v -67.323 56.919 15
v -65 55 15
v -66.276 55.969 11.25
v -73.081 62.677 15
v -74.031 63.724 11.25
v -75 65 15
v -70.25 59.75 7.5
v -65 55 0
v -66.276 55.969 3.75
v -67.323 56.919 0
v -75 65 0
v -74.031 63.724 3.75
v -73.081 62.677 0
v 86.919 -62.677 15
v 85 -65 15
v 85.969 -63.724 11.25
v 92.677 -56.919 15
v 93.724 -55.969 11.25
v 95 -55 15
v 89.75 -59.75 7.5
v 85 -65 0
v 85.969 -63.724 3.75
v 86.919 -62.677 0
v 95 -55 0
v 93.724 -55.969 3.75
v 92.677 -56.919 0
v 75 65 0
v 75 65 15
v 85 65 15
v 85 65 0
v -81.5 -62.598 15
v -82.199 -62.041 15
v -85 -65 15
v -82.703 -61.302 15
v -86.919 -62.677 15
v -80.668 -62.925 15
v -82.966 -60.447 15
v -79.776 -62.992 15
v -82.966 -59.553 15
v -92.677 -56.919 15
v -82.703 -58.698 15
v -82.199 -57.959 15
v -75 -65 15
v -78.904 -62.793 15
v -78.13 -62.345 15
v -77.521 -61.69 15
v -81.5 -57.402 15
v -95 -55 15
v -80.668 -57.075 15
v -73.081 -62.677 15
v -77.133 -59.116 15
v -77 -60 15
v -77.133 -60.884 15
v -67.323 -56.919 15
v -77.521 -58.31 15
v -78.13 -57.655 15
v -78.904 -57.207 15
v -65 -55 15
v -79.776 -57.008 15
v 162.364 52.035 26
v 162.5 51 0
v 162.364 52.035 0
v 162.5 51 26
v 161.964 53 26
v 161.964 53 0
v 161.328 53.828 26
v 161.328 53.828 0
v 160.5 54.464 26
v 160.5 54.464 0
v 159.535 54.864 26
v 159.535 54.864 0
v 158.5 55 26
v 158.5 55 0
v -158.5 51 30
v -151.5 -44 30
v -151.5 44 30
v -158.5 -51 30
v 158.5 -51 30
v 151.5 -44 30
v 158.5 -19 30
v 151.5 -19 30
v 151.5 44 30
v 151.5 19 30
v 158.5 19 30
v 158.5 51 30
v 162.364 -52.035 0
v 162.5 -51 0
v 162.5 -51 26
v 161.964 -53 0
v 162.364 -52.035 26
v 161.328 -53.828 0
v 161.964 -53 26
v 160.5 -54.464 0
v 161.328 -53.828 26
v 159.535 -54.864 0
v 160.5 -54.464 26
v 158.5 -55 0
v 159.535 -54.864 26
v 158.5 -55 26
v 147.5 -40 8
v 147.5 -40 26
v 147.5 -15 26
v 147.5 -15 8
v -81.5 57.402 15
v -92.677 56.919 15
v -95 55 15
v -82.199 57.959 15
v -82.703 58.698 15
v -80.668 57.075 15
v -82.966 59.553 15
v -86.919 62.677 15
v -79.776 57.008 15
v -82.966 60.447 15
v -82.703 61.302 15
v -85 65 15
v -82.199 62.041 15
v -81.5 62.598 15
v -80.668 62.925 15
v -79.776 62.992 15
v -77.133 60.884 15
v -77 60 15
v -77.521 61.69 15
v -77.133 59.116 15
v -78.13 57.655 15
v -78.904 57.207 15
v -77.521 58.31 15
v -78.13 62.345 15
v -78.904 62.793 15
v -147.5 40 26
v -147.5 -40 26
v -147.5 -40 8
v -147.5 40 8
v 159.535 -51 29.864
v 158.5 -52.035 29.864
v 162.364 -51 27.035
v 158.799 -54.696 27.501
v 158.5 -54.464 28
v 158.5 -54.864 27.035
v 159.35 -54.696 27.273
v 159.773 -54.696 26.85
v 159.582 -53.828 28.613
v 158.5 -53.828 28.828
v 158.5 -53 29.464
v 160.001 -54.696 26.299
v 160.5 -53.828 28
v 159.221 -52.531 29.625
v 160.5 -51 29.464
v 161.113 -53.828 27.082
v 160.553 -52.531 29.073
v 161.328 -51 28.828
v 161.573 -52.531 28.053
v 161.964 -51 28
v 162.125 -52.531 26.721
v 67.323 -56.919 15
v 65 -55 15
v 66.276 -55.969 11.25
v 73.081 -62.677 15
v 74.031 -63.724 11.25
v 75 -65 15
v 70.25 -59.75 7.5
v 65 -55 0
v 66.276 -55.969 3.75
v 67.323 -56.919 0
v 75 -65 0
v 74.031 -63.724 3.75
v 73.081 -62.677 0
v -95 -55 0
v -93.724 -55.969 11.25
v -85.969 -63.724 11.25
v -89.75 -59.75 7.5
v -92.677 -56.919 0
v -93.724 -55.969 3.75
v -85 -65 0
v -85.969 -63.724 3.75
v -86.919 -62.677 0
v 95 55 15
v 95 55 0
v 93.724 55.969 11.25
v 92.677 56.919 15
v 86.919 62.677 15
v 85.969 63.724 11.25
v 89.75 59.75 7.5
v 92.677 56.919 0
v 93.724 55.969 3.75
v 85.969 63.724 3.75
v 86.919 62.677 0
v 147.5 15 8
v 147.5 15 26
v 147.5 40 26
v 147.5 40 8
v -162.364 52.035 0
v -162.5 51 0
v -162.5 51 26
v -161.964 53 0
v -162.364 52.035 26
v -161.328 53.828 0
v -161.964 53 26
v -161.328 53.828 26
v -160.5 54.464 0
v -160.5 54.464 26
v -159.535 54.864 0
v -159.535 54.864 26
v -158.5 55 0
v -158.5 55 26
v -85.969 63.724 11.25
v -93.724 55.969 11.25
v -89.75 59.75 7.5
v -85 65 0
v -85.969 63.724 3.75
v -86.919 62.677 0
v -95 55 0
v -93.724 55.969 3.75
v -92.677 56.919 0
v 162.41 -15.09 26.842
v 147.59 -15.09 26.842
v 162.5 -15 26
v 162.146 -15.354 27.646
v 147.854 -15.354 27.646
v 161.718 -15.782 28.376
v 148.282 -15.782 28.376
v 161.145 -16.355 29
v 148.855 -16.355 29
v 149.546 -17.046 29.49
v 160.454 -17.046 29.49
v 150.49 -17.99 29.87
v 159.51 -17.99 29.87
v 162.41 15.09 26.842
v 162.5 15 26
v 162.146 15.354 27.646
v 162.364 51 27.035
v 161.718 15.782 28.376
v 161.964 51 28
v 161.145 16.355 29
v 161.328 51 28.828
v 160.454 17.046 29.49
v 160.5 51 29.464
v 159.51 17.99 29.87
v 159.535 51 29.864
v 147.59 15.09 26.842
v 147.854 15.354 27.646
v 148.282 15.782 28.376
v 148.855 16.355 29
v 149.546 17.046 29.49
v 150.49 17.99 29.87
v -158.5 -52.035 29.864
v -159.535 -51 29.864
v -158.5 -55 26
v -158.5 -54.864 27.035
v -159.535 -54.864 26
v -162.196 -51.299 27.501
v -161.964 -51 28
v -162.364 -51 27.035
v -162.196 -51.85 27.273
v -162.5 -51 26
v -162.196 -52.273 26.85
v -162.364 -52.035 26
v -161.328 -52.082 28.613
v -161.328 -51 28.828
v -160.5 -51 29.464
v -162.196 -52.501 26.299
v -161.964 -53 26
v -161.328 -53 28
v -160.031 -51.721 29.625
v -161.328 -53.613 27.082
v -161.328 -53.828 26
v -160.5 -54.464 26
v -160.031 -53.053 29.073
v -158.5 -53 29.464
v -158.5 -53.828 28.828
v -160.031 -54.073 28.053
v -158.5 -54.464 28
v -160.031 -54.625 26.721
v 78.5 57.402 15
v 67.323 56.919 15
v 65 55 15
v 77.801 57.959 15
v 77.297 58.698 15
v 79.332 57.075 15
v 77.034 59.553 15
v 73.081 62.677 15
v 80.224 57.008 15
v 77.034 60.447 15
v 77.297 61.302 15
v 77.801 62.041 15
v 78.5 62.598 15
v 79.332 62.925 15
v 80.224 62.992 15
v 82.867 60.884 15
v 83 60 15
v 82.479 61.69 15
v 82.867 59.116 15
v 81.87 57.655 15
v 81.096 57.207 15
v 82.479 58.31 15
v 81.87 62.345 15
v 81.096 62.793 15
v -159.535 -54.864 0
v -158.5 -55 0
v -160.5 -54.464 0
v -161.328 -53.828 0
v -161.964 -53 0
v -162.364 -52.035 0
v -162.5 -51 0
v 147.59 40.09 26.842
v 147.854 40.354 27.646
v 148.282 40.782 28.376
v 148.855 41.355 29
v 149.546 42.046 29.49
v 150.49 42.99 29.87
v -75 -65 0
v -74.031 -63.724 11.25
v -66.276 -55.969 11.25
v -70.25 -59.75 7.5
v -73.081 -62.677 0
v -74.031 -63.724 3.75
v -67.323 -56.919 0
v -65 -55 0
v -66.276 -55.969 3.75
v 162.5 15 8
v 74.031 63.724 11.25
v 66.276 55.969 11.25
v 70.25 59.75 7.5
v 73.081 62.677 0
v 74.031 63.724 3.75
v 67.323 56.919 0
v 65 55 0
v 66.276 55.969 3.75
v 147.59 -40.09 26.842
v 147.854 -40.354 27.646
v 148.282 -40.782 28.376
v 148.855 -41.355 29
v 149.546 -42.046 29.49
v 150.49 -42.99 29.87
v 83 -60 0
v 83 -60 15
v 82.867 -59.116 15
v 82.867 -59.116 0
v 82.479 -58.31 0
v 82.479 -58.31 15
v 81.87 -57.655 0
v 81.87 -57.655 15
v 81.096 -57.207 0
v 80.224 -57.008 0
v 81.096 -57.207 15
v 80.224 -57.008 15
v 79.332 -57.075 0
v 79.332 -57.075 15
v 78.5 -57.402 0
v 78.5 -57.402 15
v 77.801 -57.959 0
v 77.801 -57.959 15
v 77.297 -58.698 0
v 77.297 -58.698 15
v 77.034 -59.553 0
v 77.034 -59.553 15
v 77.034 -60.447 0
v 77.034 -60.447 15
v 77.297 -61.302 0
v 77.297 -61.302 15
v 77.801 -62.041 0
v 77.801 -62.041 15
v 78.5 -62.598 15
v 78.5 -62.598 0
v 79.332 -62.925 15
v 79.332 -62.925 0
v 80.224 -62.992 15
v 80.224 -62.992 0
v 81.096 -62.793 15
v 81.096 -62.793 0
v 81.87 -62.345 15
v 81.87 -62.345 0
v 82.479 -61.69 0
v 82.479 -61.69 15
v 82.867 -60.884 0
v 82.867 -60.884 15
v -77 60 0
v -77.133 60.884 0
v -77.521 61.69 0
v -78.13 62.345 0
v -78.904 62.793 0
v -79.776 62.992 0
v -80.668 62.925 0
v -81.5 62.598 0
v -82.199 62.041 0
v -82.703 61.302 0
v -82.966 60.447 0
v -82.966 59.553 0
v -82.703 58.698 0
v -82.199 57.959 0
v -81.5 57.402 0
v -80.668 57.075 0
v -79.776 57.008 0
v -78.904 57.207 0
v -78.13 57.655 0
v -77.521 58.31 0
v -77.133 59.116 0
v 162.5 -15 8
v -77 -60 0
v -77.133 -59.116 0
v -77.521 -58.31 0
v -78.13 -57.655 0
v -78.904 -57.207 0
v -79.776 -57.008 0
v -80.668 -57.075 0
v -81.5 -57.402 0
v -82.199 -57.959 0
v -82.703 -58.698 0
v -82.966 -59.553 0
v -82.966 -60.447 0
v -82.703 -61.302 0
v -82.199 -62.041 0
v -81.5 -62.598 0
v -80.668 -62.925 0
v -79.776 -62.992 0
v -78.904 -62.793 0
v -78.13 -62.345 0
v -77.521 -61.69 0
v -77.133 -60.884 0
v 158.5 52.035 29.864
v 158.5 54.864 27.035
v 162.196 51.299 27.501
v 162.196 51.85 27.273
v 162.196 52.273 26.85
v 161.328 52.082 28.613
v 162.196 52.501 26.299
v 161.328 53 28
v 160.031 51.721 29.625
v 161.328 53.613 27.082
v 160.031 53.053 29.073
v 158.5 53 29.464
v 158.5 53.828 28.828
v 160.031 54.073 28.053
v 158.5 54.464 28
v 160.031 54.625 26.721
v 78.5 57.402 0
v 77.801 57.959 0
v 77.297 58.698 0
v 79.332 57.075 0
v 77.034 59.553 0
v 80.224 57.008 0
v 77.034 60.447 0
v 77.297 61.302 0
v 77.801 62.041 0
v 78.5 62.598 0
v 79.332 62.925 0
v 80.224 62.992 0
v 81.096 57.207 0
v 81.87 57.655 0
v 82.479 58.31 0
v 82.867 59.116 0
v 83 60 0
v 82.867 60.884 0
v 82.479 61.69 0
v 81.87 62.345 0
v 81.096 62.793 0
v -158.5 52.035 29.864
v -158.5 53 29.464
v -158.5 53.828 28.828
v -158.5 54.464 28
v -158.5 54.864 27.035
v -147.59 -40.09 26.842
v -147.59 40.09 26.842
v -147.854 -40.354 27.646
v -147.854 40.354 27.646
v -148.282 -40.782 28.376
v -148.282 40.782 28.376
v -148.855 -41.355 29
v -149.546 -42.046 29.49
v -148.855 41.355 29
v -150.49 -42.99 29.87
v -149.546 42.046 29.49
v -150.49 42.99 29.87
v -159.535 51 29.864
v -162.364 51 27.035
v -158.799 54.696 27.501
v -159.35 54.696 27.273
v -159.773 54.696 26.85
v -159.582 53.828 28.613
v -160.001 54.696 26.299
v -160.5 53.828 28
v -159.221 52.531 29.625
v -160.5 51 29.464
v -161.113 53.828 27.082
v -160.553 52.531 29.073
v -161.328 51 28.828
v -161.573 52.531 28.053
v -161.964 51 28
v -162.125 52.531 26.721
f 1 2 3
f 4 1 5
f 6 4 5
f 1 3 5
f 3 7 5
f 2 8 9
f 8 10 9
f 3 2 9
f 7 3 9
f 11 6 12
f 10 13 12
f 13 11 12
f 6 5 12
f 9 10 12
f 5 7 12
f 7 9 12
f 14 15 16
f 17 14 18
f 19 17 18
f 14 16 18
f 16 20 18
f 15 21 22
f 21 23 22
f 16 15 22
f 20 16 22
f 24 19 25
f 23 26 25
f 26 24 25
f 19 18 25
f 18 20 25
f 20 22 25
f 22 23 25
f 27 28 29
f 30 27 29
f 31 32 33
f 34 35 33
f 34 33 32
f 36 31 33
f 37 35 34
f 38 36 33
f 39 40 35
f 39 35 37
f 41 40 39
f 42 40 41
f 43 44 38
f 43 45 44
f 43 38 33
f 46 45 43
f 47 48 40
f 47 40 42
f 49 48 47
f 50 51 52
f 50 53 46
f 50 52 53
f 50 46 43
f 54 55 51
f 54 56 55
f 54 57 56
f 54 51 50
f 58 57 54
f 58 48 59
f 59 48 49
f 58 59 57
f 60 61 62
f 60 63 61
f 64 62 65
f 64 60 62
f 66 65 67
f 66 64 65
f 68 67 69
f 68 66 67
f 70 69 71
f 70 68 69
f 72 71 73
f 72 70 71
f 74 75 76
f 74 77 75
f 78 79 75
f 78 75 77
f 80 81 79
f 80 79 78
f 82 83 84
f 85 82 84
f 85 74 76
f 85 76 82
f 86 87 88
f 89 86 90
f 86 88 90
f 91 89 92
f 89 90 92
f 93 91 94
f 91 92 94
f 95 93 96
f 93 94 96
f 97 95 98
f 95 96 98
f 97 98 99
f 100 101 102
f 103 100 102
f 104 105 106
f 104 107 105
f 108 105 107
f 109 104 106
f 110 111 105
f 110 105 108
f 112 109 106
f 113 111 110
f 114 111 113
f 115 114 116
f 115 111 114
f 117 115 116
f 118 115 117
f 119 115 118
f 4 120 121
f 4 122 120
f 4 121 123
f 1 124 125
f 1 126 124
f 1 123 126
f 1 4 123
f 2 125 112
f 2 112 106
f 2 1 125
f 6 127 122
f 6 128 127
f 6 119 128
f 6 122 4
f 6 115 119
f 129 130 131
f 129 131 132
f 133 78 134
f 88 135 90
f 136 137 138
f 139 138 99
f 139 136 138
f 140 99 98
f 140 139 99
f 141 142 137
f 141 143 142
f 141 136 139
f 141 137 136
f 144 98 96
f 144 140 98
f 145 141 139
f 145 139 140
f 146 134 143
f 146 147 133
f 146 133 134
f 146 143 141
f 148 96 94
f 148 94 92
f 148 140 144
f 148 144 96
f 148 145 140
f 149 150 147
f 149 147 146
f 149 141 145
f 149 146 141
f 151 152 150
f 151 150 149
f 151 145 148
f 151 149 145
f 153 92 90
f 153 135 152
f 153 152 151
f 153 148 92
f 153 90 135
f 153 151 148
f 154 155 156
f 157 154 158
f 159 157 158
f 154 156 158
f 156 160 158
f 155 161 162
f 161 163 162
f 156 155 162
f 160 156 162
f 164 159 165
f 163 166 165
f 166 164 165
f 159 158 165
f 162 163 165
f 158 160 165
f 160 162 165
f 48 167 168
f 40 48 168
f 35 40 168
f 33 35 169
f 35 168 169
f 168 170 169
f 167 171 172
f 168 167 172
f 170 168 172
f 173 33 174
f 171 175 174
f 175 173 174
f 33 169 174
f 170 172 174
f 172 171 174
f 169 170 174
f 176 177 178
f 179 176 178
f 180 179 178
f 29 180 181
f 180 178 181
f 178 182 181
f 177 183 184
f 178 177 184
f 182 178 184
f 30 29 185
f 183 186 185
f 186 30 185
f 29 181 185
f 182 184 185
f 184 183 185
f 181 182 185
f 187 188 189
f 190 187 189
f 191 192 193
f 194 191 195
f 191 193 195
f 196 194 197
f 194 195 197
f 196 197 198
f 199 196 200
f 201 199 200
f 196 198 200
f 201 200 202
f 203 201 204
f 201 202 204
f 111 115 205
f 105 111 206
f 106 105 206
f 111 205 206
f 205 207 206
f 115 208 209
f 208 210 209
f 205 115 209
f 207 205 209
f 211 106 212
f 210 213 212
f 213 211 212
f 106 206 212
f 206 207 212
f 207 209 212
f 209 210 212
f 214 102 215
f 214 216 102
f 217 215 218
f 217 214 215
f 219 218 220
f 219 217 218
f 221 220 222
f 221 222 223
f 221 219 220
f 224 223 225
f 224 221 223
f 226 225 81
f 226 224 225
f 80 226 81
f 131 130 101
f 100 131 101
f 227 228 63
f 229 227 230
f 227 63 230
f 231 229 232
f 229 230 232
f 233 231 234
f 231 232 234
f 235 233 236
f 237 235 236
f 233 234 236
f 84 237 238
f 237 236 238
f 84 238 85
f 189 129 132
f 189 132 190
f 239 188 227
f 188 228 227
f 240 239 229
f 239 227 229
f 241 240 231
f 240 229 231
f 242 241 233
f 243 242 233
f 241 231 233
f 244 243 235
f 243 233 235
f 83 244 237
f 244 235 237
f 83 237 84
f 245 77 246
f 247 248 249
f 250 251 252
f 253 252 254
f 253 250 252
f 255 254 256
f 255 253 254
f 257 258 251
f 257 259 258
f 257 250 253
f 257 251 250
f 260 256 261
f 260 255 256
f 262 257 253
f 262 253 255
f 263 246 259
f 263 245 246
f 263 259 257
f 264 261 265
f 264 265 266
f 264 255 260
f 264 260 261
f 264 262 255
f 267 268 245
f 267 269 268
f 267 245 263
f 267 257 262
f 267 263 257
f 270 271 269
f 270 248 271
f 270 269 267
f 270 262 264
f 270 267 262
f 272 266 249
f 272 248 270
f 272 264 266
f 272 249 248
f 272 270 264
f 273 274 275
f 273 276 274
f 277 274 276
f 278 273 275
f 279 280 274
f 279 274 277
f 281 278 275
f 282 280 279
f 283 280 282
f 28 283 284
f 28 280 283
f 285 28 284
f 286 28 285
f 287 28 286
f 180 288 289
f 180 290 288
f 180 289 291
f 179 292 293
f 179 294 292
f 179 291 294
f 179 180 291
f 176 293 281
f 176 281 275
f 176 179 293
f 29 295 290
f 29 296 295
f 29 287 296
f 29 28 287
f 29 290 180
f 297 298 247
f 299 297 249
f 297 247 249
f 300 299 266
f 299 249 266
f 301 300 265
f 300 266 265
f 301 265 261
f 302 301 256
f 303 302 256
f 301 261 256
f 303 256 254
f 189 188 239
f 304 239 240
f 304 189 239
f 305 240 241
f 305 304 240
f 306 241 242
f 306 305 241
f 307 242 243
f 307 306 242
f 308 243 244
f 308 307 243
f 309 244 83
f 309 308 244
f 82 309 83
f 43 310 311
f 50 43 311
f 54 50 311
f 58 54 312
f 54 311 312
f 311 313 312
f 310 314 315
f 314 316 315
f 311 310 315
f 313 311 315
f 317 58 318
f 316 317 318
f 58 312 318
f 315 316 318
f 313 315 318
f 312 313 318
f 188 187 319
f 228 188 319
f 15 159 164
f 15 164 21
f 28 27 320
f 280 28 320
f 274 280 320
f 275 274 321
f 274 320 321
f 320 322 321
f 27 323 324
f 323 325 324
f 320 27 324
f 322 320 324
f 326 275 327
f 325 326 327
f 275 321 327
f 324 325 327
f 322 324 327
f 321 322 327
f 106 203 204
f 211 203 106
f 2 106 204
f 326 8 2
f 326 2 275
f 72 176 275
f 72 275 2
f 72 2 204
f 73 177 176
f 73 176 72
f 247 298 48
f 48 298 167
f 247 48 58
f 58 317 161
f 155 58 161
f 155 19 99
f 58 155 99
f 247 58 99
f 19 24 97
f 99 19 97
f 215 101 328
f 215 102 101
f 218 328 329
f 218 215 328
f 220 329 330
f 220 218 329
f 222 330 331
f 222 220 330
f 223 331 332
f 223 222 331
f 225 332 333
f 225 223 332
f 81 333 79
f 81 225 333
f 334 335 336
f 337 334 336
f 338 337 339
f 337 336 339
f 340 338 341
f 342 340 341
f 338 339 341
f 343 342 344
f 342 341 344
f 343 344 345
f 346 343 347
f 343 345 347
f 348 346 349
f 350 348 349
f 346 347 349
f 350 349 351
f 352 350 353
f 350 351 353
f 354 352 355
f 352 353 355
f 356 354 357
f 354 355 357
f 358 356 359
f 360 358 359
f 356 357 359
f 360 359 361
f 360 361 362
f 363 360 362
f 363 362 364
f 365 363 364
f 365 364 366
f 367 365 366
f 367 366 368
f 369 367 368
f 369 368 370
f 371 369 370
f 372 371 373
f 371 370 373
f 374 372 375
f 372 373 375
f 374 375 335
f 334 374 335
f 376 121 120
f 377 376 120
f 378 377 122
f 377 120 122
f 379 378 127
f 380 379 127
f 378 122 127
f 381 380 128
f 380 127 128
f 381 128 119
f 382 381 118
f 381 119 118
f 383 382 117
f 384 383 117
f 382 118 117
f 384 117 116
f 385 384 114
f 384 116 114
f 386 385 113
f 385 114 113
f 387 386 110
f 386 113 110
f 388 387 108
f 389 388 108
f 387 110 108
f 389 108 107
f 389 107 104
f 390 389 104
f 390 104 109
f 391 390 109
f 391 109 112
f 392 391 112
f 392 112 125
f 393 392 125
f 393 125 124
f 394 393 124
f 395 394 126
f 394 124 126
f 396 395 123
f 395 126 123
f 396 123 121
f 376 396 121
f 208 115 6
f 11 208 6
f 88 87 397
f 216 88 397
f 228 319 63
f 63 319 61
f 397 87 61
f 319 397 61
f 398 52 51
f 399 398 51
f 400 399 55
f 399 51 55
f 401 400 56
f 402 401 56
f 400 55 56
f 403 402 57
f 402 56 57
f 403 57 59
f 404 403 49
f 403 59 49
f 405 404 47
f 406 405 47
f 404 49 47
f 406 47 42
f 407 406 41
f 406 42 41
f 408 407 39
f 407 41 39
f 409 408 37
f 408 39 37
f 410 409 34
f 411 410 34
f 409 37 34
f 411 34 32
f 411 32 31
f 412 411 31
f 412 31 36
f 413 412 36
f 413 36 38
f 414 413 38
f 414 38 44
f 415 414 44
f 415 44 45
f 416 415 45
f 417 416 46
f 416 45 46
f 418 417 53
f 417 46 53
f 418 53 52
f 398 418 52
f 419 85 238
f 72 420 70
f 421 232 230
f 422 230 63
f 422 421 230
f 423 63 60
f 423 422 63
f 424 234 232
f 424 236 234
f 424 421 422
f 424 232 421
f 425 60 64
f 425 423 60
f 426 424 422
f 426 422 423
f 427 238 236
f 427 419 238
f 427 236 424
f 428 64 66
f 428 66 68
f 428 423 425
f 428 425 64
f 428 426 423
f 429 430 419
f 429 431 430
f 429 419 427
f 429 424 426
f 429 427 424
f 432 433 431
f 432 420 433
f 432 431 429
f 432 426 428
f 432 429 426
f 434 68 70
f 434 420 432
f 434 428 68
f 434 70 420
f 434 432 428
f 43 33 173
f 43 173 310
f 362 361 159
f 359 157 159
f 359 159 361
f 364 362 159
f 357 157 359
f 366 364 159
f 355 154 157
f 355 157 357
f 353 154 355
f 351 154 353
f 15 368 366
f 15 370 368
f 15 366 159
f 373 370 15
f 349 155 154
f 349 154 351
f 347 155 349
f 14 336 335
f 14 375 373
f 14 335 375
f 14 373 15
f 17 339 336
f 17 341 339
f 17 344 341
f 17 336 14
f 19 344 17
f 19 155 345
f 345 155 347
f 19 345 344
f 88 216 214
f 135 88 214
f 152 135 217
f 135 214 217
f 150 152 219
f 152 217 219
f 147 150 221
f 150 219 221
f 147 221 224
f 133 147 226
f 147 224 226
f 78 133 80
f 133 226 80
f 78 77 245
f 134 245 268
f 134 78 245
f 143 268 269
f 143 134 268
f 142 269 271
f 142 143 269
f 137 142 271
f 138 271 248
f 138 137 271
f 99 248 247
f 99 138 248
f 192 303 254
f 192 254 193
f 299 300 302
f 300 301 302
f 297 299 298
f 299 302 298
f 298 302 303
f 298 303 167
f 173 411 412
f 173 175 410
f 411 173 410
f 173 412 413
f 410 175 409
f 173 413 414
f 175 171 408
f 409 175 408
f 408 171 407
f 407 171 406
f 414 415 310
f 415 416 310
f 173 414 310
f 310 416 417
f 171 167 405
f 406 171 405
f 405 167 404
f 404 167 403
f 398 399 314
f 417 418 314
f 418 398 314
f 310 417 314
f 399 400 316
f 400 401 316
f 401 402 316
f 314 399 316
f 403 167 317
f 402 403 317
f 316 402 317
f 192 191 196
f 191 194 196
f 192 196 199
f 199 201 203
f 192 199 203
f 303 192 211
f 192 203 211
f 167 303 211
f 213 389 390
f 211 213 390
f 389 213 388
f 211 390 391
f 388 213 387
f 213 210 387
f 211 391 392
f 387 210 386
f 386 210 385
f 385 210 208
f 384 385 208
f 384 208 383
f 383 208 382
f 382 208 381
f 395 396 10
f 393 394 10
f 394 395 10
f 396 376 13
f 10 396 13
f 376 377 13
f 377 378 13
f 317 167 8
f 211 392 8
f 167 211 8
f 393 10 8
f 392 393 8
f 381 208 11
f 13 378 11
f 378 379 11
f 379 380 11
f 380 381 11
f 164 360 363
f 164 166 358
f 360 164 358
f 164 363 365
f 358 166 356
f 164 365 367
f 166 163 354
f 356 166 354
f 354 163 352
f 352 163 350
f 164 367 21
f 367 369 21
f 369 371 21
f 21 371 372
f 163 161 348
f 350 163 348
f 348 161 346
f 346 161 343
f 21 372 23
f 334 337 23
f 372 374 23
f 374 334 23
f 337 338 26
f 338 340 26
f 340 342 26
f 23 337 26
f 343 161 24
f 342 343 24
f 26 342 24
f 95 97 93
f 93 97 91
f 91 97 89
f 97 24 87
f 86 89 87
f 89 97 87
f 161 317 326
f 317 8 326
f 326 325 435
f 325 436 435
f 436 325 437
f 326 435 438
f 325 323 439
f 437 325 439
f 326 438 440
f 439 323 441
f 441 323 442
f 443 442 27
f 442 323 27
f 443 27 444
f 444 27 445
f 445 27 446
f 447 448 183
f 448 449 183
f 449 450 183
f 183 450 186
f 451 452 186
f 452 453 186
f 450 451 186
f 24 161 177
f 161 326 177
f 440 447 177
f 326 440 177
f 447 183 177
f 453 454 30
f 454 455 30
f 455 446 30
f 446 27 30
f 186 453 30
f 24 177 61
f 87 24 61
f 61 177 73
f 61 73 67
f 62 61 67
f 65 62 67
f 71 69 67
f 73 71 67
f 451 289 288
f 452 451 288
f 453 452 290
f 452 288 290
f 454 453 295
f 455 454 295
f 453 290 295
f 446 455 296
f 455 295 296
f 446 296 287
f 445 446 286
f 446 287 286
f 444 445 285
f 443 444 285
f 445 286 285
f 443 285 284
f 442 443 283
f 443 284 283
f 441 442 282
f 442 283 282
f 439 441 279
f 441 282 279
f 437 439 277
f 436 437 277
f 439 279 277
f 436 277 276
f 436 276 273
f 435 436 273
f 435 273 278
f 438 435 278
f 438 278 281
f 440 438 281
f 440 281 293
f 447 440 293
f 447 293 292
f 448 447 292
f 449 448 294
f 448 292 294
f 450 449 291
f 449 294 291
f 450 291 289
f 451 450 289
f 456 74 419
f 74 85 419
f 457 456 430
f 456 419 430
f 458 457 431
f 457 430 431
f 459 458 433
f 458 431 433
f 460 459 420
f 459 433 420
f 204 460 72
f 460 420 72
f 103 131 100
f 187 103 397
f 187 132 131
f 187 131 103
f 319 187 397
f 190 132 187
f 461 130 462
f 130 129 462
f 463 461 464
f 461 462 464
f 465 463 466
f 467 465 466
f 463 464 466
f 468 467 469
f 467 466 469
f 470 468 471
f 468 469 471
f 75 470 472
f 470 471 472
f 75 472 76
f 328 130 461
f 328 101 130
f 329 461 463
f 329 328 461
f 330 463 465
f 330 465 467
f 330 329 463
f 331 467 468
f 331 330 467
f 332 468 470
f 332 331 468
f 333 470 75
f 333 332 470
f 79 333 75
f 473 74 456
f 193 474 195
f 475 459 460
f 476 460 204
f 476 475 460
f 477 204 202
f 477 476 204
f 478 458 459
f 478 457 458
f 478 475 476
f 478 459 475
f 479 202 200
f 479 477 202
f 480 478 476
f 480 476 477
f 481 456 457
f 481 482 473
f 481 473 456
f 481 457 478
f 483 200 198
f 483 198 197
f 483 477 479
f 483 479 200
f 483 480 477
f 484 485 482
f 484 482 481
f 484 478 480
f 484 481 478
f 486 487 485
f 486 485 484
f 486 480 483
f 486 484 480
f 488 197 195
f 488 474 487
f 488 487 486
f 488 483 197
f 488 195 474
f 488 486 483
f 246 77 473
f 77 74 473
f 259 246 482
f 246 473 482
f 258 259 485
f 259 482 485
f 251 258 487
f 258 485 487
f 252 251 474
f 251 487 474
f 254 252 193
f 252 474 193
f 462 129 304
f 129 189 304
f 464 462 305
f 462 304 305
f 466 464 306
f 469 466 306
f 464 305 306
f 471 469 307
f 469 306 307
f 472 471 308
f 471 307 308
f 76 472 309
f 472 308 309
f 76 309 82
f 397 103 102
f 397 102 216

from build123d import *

# Parameters (mm, degrees)
SCHIZZO1_W                   = 325
SCHIZZO1_H                   = 110
ESTRUSIONE_ESTRUSIONE1_DEPTH = 30
SCHIZZO2_W                   = 15
SCHIZZO2_H                   = 30
SCHIZZO2_W_2                 = 295
SCHIZZO2_H_2                 = 80
TAGLIO_ESTRUSIONE1_DEPTH     = 22
ESTRUSIONE_ESTRUSIONE2_START = -15
SCHIZZO3_W                   = 10
SCHIZZO3_H                   = 10
SCHIZZO3_R                   = 3
ESTRUSIONE_ESTRUSIONE2_DEPTH = 15
RACCORDO1_DEPTH              = 15
RACCORDO2_R                  = 4


with BuildPart() as part:
    # Schizzo1 → Estrusione-Estrusione1 (new body)
    with BuildSketch(Plane.XY):
        Rectangle(SCHIZZO1_W, SCHIZZO1_H)
    extrude(amount=ESTRUSIONE_ESTRUSIONE1_DEPTH)

    # Schizzo2 → Taglio-Estrusione1 (cut)
    with BuildSketch(Plane.XY.offset(30)):
        with Locations((155, 0)):
            Rectangle(SCHIZZO2_W, SCHIZZO2_H)
        Rectangle(SCHIZZO2_W_2, SCHIZZO2_H_2)
    extrude(amount=-TAGLIO_ESTRUSIONE1_DEPTH, mode=Mode.SUBTRACT)

    # Schizzo3 → Estrusione-Estrusione2 (add)
    # profile 1 of 4: a face of its own
    with BuildSketch(Plane.XY.offset(30).offset(ESTRUSIONE_ESTRUSIONE2_START)):
        with Locations((-80, 60)):
            Rectangle(SCHIZZO3_W, SCHIZZO3_H)
        with Locations((-80, 60)):
            Circle(SCHIZZO3_R, mode=Mode.SUBTRACT)
    # profile 2 of 4: a face of its own
    with BuildSketch(Plane.XY.offset(30).offset(ESTRUSIONE_ESTRUSIONE2_START)):
        with Locations((80, 60)):
            Rectangle(SCHIZZO3_W, SCHIZZO3_H)
        with Locations((80, 60)):
            Circle(SCHIZZO3_R, mode=Mode.SUBTRACT)
    # profile 3 of 4: a face of its own
    with BuildSketch(Plane.XY.offset(30).offset(ESTRUSIONE_ESTRUSIONE2_START)):
        with Locations((80, -60)):
            Rectangle(SCHIZZO3_W, SCHIZZO3_H)
        with Locations((80, -60)):
            Circle(SCHIZZO3_R, mode=Mode.SUBTRACT)
    # profile 4 of 4: a face of its own
    with BuildSketch(Plane.XY.offset(30).offset(ESTRUSIONE_ESTRUSIONE2_START)):
        with Locations((-80, -60)):
            Rectangle(SCHIZZO3_W, SCHIZZO3_H)
        with Locations((-80, -60)):
            Circle(SCHIZZO3_R, mode=Mode.SUBTRACT)
    extrude(amount=-ESTRUSIONE_ESTRUSIONE2_DEPTH)

    # Raccordo1: read off the stored shape, not the designer's step
    # Raccordo1 outline → Raccordo1 (add)
    with BuildSketch(Plane.XY):
        with BuildLine():
            Line((85, 55), (95, 55))
            add(Edge.make_bspline(
                [(95, 55), (85, 55), (85, 65)],
                knots=[0, 0, 0, 1, 1, 1], degree=2, weights=[1, 0.052631579, 1]))
            Line((85, 65), (85, 55))
        make_face()
        with BuildLine():
            Line((-95, 55), (-85, 55))
            Line((-85, 55), (-85, 65))
            add(Edge.make_bspline(
                [(-85, 65), (-85, 55), (-95, 55)],
                knots=[0, 0, 0, 1, 1, 1], degree=2, weights=[1, 0.052631579, 1]))
        make_face()
        with BuildLine():
            Line((-75, 55), (-65, 55))
            add(Edge.make_bspline(
                [(-65, 55), (-75, 55), (-75, 65)],
                knots=[0, 0, 0, 1, 1, 1], degree=2, weights=[1, 0.052631579, 1]))
            Line((-75, 65), (-75, 55))
        make_face()
        with BuildLine():
            Line((65, 55), (75, 55))
            Line((75, 55), (75, 65))
            add(Edge.make_bspline(
                [(75, 65), (75, 55), (65, 55)],
                knots=[0, 0, 0, 1, 1, 1], degree=2, weights=[1, 0.052631579, 1]))
        make_face()
        with BuildLine():
            Line((75, -55), (65, -55))
            add(Edge.make_bspline(
                [(65, -55), (75, -55), (75, -65)],
                knots=[0, 0, 0, 1, 1, 1], degree=2, weights=[1, 0.052631579, 1]))
            Line((75, -65), (75, -55))
        make_face()
        with BuildLine():
            Line((95, -55), (85, -55))
            Line((85, -55), (85, -65))
            add(Edge.make_bspline(
                [(85, -65), (85, -55), (95, -55)],
                knots=[0, 0, 0, 1, 1, 1], degree=2, weights=[1, 0.052631579, 1]))
        make_face()
        with BuildLine():
            Line((-85, -65), (-85, -55))
            Line((-85, -55), (-95, -55))
            add(Edge.make_bspline(
                [(-95, -55), (-85, -55), (-85, -65)],
                knots=[0, 0, 0, 1, 1, 1], degree=2, weights=[1, 0.052631579, 1]))
        make_face()
        with BuildLine():
            add(Edge.make_bspline(
                [(-75, -65), (-75, -55), (-65, -55)],
                knots=[0, 0, 0, 1, 1, 1], degree=2, weights=[1, 0.052631579, 1]))
            Line((-65, -55), (-75, -55))
            Line((-75, -55), (-75, -65))
        make_face()
    extrude(amount=RACCORDO1_DEPTH)

    # Raccordo2
    raccordo2_edges = [part.edges().sort_by_distance(p)[0] for p in [
        (0, 40, 30),
        (-147.5, 0, 30),
        (0, -40, 30),
        (147.5, -27.5, 30),
        (155, -15, 30),
        (162.5, -35, 30),
        (0, -55, 30),
        (-162.5, 0, 30),
        (0, 55, 30),
        (162.5, 35, 30),
        (155, 15, 30),
        (147.5, 27.5, 30),
        (-162.5, 55, 15),
        (-162.5, -55, 15),
        (162.5, -55, 15),
        (162.5, 55, 15),
    ]]
    fillet(raccordo2_edges, radius=RACCORDO2_R)


solid = part.part
